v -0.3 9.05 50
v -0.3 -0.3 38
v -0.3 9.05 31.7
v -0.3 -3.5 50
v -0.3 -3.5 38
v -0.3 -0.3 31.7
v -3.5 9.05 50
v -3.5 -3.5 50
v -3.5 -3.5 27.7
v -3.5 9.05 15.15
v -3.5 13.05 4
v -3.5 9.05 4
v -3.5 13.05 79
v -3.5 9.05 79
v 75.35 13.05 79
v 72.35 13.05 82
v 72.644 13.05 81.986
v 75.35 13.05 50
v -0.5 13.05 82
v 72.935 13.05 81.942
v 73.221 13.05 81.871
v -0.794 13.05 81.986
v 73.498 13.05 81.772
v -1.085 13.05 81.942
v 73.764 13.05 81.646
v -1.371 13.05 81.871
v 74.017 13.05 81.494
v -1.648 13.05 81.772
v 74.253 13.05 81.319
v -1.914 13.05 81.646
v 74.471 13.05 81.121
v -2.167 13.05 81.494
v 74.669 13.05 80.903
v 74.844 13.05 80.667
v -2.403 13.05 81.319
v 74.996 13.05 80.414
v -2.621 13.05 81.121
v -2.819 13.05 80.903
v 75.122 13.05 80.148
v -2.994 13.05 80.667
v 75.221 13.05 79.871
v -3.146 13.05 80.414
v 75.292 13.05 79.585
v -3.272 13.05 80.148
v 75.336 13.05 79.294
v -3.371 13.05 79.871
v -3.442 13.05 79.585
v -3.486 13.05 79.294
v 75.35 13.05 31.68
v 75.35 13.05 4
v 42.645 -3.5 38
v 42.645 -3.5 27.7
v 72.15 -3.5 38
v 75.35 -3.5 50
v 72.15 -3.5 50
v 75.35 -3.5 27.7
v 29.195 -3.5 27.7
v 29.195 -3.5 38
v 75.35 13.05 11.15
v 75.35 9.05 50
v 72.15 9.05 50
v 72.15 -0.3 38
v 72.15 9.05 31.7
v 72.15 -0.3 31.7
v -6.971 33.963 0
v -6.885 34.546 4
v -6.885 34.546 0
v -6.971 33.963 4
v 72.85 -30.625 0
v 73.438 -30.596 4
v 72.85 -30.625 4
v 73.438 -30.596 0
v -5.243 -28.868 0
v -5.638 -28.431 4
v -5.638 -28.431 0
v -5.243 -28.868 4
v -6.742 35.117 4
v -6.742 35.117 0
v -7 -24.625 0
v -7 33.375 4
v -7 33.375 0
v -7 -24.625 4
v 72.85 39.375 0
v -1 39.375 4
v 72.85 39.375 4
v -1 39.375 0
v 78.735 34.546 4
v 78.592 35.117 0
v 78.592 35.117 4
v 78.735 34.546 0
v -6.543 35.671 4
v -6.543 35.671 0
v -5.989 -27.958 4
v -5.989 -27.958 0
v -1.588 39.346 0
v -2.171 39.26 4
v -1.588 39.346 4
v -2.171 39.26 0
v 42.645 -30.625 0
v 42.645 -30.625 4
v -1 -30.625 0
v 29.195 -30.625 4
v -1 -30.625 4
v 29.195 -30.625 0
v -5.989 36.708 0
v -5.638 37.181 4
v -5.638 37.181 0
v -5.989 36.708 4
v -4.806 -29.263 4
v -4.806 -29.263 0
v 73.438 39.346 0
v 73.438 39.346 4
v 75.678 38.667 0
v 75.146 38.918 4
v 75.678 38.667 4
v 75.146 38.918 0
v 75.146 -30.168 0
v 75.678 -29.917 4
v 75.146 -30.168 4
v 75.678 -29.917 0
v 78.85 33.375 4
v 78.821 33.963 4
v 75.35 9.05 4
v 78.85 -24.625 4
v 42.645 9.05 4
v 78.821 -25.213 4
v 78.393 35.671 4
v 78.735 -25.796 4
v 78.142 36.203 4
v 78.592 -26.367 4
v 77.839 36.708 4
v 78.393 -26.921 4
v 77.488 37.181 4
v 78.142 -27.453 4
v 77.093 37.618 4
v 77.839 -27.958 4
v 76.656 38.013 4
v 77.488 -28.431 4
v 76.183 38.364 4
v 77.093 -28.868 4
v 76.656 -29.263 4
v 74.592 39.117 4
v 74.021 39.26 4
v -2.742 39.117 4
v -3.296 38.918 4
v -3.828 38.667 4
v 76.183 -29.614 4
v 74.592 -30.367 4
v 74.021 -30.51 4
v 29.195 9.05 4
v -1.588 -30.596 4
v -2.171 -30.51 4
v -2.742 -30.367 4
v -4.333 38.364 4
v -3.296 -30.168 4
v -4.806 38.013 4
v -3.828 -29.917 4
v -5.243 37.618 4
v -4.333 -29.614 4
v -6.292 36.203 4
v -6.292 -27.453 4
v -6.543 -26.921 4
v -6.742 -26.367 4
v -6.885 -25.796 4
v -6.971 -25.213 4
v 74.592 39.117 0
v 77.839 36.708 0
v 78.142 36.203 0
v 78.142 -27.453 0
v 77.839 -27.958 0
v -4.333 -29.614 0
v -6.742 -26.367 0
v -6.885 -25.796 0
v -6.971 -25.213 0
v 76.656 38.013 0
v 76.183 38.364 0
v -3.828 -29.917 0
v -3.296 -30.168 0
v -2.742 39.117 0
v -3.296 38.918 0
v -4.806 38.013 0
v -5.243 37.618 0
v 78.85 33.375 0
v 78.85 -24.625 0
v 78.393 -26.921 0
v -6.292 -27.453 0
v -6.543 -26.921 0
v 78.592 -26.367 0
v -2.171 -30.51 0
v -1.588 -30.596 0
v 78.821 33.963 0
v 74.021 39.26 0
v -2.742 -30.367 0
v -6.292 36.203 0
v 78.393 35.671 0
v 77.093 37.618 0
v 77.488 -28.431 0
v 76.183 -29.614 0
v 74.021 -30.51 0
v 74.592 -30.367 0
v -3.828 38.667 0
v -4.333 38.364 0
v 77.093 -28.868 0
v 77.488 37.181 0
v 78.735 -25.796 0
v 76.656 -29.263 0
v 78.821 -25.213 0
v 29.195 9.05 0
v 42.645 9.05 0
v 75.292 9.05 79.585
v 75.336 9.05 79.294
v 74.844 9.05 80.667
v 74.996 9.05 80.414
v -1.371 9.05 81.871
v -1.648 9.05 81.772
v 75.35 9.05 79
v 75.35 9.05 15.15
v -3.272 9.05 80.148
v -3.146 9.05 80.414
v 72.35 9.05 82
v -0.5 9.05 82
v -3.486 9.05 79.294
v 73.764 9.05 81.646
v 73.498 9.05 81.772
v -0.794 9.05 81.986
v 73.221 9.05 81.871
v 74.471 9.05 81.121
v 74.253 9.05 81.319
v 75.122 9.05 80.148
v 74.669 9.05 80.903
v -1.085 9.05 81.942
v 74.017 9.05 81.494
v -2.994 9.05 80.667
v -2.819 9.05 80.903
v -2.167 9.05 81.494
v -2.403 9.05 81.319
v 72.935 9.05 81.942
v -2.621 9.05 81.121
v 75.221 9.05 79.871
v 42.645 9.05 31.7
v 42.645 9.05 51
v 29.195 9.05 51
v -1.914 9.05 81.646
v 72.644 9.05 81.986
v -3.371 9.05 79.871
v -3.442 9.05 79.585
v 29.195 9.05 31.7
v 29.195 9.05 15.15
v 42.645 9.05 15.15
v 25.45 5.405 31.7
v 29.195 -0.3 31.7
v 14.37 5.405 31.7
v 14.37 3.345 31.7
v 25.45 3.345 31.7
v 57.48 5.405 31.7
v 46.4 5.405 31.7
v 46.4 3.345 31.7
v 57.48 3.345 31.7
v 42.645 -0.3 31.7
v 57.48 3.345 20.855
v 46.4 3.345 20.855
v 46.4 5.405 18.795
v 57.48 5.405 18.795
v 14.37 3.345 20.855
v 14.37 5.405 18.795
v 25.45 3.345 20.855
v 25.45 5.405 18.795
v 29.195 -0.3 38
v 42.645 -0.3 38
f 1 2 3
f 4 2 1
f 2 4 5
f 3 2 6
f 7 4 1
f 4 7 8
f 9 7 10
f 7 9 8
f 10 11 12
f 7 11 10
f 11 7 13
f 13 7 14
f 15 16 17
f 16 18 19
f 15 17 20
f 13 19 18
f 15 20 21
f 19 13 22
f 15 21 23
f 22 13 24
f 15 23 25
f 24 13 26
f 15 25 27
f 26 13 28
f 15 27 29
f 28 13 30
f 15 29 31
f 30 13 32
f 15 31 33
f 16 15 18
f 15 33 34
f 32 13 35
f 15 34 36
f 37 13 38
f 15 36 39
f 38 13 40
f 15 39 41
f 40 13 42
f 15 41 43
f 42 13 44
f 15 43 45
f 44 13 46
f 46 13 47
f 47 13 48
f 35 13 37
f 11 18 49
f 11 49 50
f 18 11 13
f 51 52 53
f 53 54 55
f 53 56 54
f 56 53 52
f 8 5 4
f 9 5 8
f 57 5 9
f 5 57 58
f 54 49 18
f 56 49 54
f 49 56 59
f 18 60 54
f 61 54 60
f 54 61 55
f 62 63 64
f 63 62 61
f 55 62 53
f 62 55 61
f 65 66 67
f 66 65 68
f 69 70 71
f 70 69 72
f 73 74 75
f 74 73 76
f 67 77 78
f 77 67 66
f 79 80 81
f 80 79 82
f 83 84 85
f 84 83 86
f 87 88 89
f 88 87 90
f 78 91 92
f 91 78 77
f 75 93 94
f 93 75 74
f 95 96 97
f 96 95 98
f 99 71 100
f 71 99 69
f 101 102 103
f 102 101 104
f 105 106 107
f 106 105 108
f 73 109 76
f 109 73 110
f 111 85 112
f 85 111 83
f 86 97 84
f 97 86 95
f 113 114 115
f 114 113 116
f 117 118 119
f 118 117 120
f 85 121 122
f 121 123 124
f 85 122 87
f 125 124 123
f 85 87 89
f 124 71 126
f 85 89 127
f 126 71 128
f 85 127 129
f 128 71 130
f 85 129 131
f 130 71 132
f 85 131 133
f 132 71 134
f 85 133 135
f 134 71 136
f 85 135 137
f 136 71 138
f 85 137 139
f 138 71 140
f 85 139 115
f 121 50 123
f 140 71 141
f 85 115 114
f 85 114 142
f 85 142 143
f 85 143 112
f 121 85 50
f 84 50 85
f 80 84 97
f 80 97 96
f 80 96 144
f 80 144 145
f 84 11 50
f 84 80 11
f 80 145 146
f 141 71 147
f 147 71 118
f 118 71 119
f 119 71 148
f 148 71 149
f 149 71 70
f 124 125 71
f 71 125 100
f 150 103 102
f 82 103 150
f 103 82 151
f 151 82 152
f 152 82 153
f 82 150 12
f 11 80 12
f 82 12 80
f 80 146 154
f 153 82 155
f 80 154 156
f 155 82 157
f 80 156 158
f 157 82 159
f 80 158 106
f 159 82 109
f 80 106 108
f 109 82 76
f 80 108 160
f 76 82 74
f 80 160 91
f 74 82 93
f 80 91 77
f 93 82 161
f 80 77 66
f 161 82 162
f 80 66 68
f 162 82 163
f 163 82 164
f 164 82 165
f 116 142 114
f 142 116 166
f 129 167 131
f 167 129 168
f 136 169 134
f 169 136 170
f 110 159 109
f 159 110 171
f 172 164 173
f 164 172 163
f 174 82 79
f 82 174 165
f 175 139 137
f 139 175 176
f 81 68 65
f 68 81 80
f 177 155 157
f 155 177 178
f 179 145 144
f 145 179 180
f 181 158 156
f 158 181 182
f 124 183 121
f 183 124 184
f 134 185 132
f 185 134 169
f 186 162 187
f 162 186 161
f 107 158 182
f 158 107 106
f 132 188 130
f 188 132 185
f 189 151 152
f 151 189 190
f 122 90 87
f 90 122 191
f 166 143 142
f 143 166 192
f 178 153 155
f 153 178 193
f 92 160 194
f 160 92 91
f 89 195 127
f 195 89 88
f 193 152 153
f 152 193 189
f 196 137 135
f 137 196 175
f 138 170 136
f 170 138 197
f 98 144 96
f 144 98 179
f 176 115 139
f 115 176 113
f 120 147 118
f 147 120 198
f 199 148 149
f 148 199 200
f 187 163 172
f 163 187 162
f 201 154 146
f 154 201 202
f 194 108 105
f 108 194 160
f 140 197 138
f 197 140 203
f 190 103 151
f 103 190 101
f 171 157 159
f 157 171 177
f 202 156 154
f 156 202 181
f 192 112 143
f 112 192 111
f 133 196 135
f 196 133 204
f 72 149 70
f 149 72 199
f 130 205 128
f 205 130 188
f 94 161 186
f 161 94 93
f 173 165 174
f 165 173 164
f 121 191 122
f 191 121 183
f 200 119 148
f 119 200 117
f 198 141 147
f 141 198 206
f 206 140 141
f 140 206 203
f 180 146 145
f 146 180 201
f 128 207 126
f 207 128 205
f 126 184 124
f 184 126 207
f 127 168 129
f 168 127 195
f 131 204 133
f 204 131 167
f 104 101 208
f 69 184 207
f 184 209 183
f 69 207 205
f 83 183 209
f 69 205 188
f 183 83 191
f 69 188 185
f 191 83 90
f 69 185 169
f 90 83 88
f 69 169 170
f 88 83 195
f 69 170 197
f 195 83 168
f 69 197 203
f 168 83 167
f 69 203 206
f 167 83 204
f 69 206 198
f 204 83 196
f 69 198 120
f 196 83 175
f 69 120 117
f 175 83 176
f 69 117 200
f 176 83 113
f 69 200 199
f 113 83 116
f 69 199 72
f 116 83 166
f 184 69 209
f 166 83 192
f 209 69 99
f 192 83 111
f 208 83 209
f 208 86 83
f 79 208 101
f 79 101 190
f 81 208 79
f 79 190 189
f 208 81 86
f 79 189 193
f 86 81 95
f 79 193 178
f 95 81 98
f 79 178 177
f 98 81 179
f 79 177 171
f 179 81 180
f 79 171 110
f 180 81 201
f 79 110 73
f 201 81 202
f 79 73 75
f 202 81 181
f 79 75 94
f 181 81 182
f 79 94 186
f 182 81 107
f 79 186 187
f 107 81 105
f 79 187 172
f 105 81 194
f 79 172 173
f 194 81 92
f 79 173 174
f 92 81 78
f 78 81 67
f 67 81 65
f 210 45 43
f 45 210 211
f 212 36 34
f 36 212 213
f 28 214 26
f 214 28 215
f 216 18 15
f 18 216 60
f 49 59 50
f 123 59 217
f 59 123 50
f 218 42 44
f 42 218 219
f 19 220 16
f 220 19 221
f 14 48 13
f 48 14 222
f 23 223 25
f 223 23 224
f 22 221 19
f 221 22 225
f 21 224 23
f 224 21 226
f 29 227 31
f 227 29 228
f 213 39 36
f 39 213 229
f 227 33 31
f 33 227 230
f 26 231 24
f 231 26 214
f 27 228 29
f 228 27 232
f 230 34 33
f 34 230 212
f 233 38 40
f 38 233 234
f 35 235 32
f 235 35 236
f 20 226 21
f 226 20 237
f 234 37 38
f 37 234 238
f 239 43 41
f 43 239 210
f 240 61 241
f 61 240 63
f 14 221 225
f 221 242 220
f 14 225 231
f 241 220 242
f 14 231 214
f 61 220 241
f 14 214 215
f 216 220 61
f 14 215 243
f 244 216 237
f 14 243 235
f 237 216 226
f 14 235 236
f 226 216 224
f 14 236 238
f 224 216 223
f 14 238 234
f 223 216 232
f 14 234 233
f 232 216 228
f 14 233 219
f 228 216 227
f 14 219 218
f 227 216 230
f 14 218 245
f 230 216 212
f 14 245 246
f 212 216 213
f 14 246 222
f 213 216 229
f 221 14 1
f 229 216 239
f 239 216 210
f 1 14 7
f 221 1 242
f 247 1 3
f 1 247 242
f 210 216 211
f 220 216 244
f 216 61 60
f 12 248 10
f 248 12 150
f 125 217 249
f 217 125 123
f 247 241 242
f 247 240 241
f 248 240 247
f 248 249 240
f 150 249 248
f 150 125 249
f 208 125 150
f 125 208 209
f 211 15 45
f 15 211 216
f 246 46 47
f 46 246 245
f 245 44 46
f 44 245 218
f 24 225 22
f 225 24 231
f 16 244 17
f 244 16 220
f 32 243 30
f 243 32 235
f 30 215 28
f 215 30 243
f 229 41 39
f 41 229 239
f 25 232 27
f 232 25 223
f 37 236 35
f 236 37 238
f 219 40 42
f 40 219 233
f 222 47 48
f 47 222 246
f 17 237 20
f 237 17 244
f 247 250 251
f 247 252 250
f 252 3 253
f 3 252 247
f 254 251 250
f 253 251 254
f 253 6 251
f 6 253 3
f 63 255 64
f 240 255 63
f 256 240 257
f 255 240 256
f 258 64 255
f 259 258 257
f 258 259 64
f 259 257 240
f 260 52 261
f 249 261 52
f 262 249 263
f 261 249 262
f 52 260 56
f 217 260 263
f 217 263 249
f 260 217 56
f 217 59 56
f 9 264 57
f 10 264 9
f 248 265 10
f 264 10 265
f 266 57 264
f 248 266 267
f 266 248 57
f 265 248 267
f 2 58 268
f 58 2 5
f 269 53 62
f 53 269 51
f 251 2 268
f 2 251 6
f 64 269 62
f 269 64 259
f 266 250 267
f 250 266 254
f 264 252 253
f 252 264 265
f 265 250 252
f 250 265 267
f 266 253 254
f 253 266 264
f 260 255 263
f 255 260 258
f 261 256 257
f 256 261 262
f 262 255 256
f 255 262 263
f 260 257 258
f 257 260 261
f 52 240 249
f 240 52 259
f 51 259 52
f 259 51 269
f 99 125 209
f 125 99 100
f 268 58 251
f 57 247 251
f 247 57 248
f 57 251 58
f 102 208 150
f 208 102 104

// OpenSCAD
// Reference design by GPT-6.1 Sol, smoothstone gold set (e06_iphone_desk_holder). Copied as made; the recipes adapt it.
// e06: dimensions in millimeters, product screen toward -y, portrait +z.
phone_w = 71.85;       // product.body.w
phone_d = 8.75;        // product.body.d
phone_h = 150.01;      // product.body.h
phone_corner_r = 0.0;  // product.body.corner_r, enclosing box, not an edge radius
usb_u = 35.93;        // product.features[0].c[0], bottom-face u = phone_w - x
usb_v = 4.375;        // product.features[0].c[1]
usb_w = 9.0;          // product.features[0].size[0]
usb_h = 3.25;         // product.features[0].size[1]
plug_w = 12.45;       // product.features[0].plug[0]
plug_d = 6.6;         // product.features[0].plug[1]
plug_reach = 14.0;    // product.features[0].depth
speaker_u = 51.94;    // product.features[1].c[0]
speaker_v = 4.375;    // product.features[1].c[1]
speaker_w = 10.08;    // product.features[1].size[0]
speaker_d = 1.06;     // product.features[1].size[1]
mic_u = 19.91;        // product.features[2].c[0]
mic_v = 4.375;        // product.features[2].c[1]
mic_w = 10.08;        // product.features[2].size[0]
mic_d = 1.06;         // product.features[2].size[1]

// Chosen manufacturing and use dimensions, justified in NOTES.md.
gap = 0.30;           // Midpoint of the spec grader's PLA slip band, per side.
wall = 3.2;           // Eight nominal 0.4 mm lines at the cradle's perimeter.
shelf_t = 4.0;        // Ten nominal lines; also the spine thickness.
base_t = 4.0;         // Broad flat sole and ballast volume.
foot_extra_x = 7.0;   // Sole projects 3.5 mm beyond the cradle on either side.
foot_depth = 70.0;    // 35 mm each side of the phone's thickness centerline.
foot_r = 6.0;         // Rounded plan corners; flat bed face, no lower fillet.
bottom_z = 32.0;      // Leaves 14 mm connector length and 18 mm below for routing.
front_rise = 6.0;     // Low screen lip, within the permitted 10% front obstruction.
side_rise = 18.0;     // Guides the bottom corners without enclosing the phone.
back_rise = 50.0;     // Lower-third backrest, below the camera region.
back_top_r = 3.0;     // Rounded top corners, square lower corners at the joint.
feature_gap = 0.50;   // Per-side opening tolerance beyond the published keepouts.
eps = 0.02;           // Boolean overlap only, not a manufactured clearance.
$fn = 64;

left = -gap-wall;
right = phone_w+gap+wall;
front = -gap-wall;
rear_inner = phone_d+gap;
rear = rear_inner+shelf_t;
shelf_z = bottom_z-gap;
foot_front = phone_d/2-foot_depth/2;
foot_back = phone_d/2+foot_depth/2;
usb_x = phone_w-usb_u;
channel_w = plug_w+2*feature_gap;

module round_plan(x0, x1, y0, y1, r, h) {
    translate([x0+r,y0+r,0])
        linear_extrude(h)
            offset(r=r) square([x1-x0-2*r,y1-y0-2*r]);
}

// Extrude a y,z cross-section along x. Underside advances one mm per mm up.
module ramp_shelf() {
    multmatrix([[0,0,1,left],[1,0,0,0],[0,1,0,0],[0,0,0,1]])
        linear_extrude(right-left)
            polygon([[front,shelf_z-shelf_t], [front,shelf_z],
                     [rear,shelf_z], [rear,shelf_z-shelf_t-(rear-front)]]);
}

module backrest() {
    // Rounded upper corners in x,z, extruded toward the rear.
    translate([0,rear,0]) rotate([90,0,0])
        linear_extrude(shelf_t)
            union() {
                translate([left,base_t-eps])
                    square([right-left,bottom_z+back_rise-back_top_r-base_t+eps]);
                translate([left+back_top_r,bottom_z+back_rise-back_top_r])
                    square([right-left-2*back_top_r,back_top_r]);
                for (x=[left+back_top_r,right-back_top_r])
                    translate([x,bottom_z+back_rise-back_top_r]) circle(r=back_top_r);
            }
}

module stand_blank() {
    round_plan(-foot_extra_x,phone_w+foot_extra_x,
               foot_front,foot_back,foot_r,base_t);
    backrest();
    ramp_shelf();
    // Front lip and side guides all overlap the shelf by eps.
    translate([left,front,shelf_z-eps])
        cube([right-left,wall,bottom_z+front_rise-shelf_z+eps]);
    for (x=[left,phone_w+gap])
        translate([x,front,shelf_z-eps])
            cube([wall,rear-front,bottom_z+side_rise-shelf_z+eps]);
}

difference() {
    union() { stand_blank(); }
    // Open all the way to the front and through the sole: no cable-threading hole.
    translate([usb_x-channel_w/2,foot_front-1,-1])
        cube([channel_w,rear_inner-foot_front+1,bottom_z+side_rise+2]);
    // Acoustic paths open through the inclined shelf into free air above the foot.
    // The foot is well below their full graded path, with lateral access to air.
    for (f=[[speaker_u,speaker_v,speaker_w,speaker_d],
            [mic_u,mic_v,mic_w,mic_d]])
        translate([phone_w-f[0]-f[2]/2-feature_gap,
                   f[1]-f[3]/2-feature_gap,base_t+eps])
            cube([f[2]+2*feature_gap,f[3]+2*feature_gap,bottom_z+1]);
}
